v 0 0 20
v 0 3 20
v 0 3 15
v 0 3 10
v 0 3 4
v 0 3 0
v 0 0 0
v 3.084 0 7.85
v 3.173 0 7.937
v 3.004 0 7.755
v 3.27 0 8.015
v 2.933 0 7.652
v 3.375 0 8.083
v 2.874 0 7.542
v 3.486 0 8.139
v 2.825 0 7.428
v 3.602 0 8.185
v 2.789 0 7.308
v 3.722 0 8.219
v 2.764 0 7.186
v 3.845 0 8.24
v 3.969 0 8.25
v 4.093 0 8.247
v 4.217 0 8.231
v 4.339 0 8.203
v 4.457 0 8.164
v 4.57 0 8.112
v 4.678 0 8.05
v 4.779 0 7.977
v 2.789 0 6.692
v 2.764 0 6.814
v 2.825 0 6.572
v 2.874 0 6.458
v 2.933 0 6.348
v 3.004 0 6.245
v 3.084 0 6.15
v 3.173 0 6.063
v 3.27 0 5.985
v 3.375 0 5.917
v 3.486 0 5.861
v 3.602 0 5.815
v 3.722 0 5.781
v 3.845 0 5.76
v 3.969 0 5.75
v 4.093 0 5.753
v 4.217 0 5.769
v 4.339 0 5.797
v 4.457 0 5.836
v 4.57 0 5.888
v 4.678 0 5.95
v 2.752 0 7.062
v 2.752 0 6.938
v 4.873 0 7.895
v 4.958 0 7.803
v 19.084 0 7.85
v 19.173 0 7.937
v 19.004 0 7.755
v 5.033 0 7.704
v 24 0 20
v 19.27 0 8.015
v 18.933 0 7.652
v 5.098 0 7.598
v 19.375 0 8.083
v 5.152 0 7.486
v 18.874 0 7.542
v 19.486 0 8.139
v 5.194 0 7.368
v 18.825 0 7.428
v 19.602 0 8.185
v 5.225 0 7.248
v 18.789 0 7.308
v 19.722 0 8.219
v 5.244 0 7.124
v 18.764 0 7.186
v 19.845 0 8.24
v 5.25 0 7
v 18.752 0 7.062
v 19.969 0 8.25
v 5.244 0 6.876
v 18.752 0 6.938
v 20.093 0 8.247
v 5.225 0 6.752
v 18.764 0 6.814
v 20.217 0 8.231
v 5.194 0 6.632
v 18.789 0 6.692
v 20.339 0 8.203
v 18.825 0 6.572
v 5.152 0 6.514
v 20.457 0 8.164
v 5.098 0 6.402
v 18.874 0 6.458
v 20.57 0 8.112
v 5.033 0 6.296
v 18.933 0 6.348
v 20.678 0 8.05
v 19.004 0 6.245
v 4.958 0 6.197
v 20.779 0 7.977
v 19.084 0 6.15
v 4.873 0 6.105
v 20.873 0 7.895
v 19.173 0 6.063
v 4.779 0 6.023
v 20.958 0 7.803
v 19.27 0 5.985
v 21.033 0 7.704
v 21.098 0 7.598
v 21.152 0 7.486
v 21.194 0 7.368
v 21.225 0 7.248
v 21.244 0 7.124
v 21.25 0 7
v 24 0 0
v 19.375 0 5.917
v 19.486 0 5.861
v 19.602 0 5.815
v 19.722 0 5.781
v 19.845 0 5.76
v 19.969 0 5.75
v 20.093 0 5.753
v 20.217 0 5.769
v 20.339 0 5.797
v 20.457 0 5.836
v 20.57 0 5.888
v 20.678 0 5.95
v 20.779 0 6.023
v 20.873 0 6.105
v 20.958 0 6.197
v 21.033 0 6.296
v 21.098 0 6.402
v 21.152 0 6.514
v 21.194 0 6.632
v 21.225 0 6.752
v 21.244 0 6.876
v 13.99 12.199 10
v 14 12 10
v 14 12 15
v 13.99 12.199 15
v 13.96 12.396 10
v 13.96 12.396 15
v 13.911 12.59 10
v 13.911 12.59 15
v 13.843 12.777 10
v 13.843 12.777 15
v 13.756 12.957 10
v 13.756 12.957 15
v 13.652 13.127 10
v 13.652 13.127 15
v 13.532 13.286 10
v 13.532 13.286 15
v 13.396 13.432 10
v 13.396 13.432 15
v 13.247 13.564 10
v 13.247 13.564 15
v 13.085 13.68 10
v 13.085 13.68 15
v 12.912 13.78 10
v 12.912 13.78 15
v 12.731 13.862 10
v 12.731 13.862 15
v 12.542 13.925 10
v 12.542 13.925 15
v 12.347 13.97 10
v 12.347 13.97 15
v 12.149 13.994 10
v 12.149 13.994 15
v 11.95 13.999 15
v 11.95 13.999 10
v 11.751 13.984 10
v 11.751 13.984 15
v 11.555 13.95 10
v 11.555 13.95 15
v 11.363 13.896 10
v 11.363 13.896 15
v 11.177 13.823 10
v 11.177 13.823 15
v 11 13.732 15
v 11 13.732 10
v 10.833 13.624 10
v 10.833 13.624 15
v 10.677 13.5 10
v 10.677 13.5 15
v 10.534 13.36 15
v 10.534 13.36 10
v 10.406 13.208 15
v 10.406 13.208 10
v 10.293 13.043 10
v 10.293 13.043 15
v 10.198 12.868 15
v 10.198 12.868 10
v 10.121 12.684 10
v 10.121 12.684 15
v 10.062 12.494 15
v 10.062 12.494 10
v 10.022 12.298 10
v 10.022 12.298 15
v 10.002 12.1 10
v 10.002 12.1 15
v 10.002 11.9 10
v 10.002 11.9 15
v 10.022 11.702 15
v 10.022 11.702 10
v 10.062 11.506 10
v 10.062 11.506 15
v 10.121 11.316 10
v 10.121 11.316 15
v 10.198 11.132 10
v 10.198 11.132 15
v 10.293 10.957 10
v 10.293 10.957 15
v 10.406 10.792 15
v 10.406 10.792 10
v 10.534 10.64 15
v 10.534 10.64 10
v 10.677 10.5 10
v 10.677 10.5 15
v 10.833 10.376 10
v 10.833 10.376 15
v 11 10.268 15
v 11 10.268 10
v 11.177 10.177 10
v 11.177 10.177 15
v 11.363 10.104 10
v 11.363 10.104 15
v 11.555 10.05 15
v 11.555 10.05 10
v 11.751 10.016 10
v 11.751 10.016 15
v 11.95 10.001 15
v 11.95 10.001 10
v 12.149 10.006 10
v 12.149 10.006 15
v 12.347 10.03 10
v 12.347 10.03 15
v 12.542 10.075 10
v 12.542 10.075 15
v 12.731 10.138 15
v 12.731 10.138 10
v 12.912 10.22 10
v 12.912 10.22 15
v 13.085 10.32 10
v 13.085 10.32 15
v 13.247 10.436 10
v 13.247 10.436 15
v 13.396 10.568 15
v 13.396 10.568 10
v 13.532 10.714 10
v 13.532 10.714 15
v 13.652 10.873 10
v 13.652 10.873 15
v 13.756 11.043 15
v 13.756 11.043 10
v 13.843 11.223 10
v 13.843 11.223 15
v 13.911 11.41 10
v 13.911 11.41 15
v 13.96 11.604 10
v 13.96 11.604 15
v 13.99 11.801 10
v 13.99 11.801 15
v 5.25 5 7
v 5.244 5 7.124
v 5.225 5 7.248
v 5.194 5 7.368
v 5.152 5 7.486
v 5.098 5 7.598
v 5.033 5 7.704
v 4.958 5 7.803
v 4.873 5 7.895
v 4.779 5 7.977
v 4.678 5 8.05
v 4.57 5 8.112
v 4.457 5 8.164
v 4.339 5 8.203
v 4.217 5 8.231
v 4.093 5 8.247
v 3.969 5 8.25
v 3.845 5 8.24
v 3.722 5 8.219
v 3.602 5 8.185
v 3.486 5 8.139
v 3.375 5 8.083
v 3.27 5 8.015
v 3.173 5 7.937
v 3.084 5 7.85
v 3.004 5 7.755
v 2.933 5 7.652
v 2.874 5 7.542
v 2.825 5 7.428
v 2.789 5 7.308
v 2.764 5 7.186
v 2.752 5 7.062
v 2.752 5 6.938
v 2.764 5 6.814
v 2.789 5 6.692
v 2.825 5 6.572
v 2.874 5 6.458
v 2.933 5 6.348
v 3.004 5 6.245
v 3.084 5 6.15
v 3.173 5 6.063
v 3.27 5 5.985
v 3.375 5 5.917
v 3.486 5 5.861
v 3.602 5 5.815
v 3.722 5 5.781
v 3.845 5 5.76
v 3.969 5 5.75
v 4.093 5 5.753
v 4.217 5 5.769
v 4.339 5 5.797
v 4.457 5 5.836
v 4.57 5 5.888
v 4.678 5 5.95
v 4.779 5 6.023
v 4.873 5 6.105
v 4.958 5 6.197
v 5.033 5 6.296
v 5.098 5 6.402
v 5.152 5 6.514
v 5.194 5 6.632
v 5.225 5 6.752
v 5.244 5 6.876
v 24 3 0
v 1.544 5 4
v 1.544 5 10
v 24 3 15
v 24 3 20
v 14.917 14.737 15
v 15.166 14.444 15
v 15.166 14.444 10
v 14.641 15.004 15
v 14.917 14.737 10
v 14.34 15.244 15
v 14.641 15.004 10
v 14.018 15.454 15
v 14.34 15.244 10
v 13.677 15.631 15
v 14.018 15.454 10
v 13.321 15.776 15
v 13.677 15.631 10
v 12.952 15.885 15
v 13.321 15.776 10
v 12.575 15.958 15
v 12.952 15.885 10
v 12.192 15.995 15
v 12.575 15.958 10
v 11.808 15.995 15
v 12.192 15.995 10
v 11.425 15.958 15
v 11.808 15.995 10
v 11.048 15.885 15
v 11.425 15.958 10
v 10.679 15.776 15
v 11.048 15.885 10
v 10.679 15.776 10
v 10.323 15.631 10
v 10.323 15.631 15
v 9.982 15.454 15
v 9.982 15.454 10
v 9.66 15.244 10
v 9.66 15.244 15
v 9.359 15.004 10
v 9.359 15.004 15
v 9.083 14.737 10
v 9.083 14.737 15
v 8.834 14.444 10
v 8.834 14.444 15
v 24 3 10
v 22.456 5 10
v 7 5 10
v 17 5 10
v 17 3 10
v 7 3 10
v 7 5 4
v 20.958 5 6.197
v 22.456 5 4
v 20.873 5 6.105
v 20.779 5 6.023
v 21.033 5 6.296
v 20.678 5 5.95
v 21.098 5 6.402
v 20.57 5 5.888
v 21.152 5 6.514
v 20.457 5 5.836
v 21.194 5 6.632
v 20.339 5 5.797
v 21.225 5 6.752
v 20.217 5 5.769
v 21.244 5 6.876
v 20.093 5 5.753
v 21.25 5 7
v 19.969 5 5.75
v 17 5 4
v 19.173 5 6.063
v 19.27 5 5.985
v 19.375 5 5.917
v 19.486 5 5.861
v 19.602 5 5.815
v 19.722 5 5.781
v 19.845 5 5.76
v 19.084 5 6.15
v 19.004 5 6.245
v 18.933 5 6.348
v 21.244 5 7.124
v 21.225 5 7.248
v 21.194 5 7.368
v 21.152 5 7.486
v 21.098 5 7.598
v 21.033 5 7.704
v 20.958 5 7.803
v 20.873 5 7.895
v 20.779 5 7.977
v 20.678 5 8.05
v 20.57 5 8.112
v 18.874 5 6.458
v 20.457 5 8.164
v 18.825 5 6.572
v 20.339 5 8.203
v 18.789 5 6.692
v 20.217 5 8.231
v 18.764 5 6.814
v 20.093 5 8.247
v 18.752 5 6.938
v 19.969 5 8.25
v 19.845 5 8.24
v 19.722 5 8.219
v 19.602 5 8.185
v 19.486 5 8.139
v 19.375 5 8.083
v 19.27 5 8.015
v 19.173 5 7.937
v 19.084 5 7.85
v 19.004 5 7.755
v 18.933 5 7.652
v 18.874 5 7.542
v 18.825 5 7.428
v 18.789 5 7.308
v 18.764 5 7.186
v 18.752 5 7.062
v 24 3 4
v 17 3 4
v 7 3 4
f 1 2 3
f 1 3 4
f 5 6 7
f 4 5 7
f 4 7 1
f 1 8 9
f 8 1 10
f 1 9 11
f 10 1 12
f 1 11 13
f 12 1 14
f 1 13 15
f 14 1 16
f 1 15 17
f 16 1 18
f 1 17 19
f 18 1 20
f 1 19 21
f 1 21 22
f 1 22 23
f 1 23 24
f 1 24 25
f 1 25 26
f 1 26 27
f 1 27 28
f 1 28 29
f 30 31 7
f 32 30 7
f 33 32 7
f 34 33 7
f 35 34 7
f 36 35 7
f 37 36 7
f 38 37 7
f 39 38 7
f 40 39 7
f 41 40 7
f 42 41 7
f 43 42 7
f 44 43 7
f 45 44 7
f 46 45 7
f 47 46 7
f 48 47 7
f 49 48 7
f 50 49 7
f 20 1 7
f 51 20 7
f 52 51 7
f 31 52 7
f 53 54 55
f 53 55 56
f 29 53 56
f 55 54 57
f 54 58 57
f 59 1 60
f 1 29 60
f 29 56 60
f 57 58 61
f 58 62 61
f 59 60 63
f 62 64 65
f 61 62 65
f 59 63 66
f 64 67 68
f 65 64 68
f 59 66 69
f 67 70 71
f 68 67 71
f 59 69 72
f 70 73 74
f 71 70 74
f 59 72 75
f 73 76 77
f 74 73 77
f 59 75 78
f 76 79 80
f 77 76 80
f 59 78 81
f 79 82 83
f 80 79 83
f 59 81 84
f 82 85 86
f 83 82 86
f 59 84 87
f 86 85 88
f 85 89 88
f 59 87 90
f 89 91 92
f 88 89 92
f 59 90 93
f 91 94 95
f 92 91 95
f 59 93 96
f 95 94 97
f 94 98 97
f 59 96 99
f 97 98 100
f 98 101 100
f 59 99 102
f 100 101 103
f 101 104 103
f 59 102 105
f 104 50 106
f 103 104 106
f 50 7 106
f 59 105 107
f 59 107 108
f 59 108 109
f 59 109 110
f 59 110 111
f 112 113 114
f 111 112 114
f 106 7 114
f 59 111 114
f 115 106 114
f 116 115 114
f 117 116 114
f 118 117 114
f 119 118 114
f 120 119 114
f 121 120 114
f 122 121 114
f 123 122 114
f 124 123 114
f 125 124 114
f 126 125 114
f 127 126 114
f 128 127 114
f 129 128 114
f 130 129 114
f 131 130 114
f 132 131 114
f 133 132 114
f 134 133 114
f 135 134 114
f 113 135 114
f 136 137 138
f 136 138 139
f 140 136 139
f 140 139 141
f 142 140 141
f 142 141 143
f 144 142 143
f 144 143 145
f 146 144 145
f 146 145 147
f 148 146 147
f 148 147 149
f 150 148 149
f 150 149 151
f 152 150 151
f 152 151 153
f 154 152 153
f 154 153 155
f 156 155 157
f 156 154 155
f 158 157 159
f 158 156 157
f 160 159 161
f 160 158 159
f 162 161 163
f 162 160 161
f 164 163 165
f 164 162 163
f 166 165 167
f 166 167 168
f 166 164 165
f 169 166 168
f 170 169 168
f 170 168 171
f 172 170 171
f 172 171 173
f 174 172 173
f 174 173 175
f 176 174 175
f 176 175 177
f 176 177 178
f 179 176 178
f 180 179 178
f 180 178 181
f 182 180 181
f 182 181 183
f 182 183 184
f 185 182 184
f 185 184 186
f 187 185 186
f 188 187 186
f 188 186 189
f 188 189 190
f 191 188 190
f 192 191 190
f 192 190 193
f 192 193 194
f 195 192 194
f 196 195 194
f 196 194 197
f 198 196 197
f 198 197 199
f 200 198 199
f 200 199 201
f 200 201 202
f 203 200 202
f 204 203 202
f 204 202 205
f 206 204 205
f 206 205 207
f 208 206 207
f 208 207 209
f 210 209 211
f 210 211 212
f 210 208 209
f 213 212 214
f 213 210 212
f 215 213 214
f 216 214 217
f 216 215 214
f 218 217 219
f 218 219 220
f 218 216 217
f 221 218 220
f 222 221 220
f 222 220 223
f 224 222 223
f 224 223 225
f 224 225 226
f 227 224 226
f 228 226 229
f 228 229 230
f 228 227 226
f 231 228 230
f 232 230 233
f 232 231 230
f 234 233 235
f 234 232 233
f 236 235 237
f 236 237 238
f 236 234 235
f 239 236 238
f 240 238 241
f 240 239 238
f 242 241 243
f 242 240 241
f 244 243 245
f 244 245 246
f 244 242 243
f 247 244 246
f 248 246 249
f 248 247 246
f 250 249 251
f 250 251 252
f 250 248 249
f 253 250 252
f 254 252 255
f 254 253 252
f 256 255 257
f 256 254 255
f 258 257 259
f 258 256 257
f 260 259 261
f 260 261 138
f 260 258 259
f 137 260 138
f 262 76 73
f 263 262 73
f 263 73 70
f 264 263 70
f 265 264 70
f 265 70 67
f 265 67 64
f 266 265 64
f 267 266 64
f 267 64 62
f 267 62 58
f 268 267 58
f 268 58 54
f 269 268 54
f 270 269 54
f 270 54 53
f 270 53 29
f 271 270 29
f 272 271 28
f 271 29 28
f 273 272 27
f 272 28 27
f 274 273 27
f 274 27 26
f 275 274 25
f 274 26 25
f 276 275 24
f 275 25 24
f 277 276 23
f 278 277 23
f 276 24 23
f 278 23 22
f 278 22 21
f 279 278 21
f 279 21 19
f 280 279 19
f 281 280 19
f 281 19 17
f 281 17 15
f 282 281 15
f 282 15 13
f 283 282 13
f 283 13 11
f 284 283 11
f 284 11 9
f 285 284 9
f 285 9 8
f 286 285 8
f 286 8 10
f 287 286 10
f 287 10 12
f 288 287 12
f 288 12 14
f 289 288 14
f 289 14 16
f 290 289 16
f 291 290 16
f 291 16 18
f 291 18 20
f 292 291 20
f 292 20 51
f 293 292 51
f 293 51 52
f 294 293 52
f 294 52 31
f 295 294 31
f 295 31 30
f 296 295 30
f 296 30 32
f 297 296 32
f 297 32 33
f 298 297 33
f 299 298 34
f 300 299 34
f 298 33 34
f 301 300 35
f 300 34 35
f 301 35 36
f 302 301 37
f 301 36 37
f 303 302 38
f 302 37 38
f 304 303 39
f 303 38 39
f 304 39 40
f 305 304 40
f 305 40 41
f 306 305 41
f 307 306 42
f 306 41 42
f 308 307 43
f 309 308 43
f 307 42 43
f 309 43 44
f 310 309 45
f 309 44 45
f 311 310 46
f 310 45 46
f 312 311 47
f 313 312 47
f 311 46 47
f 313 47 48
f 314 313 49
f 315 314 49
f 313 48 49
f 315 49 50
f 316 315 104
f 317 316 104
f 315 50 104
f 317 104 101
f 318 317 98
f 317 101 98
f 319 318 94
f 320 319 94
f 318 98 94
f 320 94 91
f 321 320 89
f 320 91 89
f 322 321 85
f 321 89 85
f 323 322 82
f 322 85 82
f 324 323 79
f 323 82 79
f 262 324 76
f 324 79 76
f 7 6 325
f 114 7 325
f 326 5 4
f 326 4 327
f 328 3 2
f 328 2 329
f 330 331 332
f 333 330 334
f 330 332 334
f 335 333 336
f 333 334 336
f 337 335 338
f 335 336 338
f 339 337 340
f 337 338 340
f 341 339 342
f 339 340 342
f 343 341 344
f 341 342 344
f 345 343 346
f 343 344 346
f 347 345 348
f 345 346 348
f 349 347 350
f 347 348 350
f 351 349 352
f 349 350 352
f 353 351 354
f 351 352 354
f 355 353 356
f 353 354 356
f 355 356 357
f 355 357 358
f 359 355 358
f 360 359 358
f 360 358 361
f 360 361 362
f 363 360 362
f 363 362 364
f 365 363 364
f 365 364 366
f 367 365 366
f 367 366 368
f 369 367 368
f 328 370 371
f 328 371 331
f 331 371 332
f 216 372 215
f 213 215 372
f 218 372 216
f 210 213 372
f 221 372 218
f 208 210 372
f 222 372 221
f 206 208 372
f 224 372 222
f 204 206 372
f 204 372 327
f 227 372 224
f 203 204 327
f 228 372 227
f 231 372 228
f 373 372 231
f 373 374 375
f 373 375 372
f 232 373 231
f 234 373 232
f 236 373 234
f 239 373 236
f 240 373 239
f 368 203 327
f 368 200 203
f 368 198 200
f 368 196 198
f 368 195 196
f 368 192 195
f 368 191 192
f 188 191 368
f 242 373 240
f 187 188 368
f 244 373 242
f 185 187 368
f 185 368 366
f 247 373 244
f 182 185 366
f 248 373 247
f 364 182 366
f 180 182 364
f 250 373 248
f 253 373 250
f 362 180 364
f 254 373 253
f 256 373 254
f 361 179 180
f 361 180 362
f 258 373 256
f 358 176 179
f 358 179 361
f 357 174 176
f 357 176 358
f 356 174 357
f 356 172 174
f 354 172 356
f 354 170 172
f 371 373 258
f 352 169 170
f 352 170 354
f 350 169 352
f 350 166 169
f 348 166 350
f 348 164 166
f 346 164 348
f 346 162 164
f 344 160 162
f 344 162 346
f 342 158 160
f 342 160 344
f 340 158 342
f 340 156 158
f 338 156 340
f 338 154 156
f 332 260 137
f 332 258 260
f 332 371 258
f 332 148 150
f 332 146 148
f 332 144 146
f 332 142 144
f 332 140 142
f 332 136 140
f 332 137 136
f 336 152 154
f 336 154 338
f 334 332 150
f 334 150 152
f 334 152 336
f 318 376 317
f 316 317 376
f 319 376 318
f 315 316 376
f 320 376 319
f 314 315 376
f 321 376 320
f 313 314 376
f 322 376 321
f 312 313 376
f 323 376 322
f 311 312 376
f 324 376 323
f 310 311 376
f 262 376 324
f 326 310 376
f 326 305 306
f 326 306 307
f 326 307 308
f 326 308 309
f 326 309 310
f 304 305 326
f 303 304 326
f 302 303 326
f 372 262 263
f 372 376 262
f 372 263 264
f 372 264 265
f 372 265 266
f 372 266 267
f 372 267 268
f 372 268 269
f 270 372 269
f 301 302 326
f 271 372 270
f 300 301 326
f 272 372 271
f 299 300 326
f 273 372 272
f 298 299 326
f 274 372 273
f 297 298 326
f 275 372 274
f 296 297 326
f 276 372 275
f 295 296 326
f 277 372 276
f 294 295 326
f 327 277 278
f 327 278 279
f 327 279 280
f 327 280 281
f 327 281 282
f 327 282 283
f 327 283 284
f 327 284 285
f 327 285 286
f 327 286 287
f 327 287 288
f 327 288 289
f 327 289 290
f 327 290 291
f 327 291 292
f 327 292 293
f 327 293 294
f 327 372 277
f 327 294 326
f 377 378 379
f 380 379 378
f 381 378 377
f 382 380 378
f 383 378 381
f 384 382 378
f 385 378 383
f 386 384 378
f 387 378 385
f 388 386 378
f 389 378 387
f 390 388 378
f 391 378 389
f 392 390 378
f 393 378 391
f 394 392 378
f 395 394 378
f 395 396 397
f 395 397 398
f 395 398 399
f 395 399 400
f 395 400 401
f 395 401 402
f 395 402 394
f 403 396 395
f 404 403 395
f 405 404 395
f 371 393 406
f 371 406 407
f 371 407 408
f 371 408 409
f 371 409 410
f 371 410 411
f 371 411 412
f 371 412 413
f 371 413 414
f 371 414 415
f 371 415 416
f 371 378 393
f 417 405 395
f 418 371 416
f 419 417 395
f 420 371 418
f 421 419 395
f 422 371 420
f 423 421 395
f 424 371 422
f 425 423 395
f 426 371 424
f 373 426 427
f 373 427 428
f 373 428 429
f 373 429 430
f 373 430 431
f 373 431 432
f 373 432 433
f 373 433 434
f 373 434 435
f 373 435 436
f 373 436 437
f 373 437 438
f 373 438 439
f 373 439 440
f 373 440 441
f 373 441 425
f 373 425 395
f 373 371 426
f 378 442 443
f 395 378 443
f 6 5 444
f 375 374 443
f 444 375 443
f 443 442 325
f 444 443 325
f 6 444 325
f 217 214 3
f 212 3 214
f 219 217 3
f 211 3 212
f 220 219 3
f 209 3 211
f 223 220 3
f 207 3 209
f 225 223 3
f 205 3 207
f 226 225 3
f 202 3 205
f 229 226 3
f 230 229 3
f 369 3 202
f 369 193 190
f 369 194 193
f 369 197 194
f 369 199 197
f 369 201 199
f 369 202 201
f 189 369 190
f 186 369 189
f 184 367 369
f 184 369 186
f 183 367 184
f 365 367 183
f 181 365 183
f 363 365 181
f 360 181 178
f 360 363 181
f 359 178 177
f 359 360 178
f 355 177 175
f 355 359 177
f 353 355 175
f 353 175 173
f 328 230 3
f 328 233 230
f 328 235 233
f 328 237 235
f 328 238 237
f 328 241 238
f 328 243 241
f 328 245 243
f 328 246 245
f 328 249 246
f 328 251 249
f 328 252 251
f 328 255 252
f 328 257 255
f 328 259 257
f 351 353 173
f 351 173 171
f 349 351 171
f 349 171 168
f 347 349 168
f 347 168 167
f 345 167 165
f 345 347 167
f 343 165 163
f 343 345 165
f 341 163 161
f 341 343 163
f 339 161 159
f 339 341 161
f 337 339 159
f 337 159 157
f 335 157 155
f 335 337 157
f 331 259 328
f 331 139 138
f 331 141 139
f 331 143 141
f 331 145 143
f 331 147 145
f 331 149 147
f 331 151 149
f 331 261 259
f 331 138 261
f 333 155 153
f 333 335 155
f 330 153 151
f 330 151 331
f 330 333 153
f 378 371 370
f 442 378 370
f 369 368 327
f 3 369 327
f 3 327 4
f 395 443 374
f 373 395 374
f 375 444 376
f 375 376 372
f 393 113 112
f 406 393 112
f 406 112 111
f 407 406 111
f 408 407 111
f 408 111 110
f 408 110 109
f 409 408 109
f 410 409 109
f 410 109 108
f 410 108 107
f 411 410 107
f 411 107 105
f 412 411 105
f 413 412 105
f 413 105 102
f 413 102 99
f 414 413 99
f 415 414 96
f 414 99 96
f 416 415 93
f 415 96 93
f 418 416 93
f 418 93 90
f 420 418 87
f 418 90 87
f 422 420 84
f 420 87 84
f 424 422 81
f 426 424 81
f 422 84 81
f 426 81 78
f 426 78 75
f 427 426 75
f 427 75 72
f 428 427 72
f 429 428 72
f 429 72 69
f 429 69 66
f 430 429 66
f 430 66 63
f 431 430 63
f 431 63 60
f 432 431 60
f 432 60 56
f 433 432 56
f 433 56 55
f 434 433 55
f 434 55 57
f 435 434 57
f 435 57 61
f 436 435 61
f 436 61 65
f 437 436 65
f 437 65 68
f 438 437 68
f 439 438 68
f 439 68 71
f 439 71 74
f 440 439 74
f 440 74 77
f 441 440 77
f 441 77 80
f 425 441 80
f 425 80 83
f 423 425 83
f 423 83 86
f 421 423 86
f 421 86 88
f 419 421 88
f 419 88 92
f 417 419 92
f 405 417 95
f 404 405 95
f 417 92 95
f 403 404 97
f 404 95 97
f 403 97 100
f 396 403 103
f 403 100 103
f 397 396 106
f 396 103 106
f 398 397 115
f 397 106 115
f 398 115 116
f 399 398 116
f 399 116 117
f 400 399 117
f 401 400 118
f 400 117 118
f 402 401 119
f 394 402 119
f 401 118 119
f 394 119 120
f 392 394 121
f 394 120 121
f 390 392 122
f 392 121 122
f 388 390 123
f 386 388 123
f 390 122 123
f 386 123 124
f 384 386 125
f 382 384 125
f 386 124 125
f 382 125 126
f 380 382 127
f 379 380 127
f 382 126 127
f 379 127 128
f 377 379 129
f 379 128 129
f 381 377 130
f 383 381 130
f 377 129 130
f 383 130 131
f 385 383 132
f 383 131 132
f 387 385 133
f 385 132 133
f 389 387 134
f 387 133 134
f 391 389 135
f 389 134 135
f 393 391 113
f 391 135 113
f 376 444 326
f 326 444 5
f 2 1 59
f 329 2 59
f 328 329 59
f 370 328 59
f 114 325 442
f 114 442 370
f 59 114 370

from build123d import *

# Parameters (mm, degrees)
SKETCH1_R           = 2
BOSS_EXTRUDE1_DEPTH = 15
SKETCH2_W           = 10
SKETCH2_H           = 23.787832066
CUT_EXTRUDE1_DEPTH  = 33.511536414
SKETCH5_W           = 7
SKETCH5_H           = 6
BOSS_EXTRUDE3_DEPTH = 2
SKETCH3_R           = 1.25
CUT_EXTRUDE2_DEPTH  = 33.511536414
SKETCH4_W           = 24
SKETCH4_H           = 3
BOSS_EXTRUDE2_DEPTH = 5
CUT_EXTRUDE3_DEPTH  = 31.528675045


with BuildPart() as part:
    # Sketch1 → Boss-Extrude1 (new body)
    with BuildSketch(Plane.XY):
        with BuildLine():
            Line((0, 0), (24, 0))
            Line((24, 0), (24, 3))
            Line((24, 3), (15.166426501, 14.444124223))
            ThreePointArc((15.166426501, 14.444124223), (12, 16), (8.833573499, 14.444124223))
            Line((8.833573499, 14.444124223), (0, 3))
            Line((0, 3), (0, 0))
        make_face()
        with Locations((12, 12)):
            Circle(SKETCH1_R, mode=Mode.SUBTRACT)
    extrude(amount=BOSS_EXTRUDE1_DEPTH)

    # Sketch2 → Cut-Extrude1 (cut, through all)
    with BuildSketch(Plane(origin=(24, 0, 0), x_dir=(0, 0, -1), z_dir=(1, 0, 0))):
        with Locations((-5, 14.893916033)):
            Rectangle(SKETCH2_W, SKETCH2_H)
    extrude(amount=-CUT_EXTRUDE1_DEPTH, mode=Mode.SUBTRACT)

    # Sketch5 → Boss-Extrude3 (add)
    with BuildSketch(Plane(origin=(0, 3, 0), x_dir=(-1, 0, 0), z_dir=(0, 1, 0))):
        with Locations((-20.5, 7)):
            Rectangle(SKETCH5_W, SKETCH5_H)
        with Locations((-3.5, 7)):
            Rectangle(SKETCH5_W, SKETCH5_H)
    extrude(amount=BOSS_EXTRUDE3_DEPTH)

    # Sketch3 → Cut-Extrude2 (cut, through all)
    with BuildSketch(Plane.XZ):
        with Locations((4, 7)):
            Circle(SKETCH3_R)
        with Locations((20, 7)):
            Circle(SKETCH3_R)
    extrude(amount=-CUT_EXTRUDE2_DEPTH, mode=Mode.SUBTRACT)

    # Sketch4 → Boss-Extrude2 (add)
    with BuildSketch(Plane(origin=(0, 14, 15), x_dir=(1, 0, 0), z_dir=(0, 0, -1))):
        with Locations((12, 12.5)):
            Rectangle(SKETCH4_W, SKETCH4_H)
    extrude(amount=-BOSS_EXTRUDE2_DEPTH)

    # Sketch6 → Cut-Extrude3 (cut, through all)
    with BuildSketch(Plane.XY.offset(10)):
        Polygon((0, 5), (0, 3), (1.543774487, 5), align=None)
        Polygon((24, 5), (22.456225513, 5), (24, 3), align=None)
    extrude(amount=-CUT_EXTRUDE3_DEPTH, mode=Mode.SUBTRACT)


solid = part.part
